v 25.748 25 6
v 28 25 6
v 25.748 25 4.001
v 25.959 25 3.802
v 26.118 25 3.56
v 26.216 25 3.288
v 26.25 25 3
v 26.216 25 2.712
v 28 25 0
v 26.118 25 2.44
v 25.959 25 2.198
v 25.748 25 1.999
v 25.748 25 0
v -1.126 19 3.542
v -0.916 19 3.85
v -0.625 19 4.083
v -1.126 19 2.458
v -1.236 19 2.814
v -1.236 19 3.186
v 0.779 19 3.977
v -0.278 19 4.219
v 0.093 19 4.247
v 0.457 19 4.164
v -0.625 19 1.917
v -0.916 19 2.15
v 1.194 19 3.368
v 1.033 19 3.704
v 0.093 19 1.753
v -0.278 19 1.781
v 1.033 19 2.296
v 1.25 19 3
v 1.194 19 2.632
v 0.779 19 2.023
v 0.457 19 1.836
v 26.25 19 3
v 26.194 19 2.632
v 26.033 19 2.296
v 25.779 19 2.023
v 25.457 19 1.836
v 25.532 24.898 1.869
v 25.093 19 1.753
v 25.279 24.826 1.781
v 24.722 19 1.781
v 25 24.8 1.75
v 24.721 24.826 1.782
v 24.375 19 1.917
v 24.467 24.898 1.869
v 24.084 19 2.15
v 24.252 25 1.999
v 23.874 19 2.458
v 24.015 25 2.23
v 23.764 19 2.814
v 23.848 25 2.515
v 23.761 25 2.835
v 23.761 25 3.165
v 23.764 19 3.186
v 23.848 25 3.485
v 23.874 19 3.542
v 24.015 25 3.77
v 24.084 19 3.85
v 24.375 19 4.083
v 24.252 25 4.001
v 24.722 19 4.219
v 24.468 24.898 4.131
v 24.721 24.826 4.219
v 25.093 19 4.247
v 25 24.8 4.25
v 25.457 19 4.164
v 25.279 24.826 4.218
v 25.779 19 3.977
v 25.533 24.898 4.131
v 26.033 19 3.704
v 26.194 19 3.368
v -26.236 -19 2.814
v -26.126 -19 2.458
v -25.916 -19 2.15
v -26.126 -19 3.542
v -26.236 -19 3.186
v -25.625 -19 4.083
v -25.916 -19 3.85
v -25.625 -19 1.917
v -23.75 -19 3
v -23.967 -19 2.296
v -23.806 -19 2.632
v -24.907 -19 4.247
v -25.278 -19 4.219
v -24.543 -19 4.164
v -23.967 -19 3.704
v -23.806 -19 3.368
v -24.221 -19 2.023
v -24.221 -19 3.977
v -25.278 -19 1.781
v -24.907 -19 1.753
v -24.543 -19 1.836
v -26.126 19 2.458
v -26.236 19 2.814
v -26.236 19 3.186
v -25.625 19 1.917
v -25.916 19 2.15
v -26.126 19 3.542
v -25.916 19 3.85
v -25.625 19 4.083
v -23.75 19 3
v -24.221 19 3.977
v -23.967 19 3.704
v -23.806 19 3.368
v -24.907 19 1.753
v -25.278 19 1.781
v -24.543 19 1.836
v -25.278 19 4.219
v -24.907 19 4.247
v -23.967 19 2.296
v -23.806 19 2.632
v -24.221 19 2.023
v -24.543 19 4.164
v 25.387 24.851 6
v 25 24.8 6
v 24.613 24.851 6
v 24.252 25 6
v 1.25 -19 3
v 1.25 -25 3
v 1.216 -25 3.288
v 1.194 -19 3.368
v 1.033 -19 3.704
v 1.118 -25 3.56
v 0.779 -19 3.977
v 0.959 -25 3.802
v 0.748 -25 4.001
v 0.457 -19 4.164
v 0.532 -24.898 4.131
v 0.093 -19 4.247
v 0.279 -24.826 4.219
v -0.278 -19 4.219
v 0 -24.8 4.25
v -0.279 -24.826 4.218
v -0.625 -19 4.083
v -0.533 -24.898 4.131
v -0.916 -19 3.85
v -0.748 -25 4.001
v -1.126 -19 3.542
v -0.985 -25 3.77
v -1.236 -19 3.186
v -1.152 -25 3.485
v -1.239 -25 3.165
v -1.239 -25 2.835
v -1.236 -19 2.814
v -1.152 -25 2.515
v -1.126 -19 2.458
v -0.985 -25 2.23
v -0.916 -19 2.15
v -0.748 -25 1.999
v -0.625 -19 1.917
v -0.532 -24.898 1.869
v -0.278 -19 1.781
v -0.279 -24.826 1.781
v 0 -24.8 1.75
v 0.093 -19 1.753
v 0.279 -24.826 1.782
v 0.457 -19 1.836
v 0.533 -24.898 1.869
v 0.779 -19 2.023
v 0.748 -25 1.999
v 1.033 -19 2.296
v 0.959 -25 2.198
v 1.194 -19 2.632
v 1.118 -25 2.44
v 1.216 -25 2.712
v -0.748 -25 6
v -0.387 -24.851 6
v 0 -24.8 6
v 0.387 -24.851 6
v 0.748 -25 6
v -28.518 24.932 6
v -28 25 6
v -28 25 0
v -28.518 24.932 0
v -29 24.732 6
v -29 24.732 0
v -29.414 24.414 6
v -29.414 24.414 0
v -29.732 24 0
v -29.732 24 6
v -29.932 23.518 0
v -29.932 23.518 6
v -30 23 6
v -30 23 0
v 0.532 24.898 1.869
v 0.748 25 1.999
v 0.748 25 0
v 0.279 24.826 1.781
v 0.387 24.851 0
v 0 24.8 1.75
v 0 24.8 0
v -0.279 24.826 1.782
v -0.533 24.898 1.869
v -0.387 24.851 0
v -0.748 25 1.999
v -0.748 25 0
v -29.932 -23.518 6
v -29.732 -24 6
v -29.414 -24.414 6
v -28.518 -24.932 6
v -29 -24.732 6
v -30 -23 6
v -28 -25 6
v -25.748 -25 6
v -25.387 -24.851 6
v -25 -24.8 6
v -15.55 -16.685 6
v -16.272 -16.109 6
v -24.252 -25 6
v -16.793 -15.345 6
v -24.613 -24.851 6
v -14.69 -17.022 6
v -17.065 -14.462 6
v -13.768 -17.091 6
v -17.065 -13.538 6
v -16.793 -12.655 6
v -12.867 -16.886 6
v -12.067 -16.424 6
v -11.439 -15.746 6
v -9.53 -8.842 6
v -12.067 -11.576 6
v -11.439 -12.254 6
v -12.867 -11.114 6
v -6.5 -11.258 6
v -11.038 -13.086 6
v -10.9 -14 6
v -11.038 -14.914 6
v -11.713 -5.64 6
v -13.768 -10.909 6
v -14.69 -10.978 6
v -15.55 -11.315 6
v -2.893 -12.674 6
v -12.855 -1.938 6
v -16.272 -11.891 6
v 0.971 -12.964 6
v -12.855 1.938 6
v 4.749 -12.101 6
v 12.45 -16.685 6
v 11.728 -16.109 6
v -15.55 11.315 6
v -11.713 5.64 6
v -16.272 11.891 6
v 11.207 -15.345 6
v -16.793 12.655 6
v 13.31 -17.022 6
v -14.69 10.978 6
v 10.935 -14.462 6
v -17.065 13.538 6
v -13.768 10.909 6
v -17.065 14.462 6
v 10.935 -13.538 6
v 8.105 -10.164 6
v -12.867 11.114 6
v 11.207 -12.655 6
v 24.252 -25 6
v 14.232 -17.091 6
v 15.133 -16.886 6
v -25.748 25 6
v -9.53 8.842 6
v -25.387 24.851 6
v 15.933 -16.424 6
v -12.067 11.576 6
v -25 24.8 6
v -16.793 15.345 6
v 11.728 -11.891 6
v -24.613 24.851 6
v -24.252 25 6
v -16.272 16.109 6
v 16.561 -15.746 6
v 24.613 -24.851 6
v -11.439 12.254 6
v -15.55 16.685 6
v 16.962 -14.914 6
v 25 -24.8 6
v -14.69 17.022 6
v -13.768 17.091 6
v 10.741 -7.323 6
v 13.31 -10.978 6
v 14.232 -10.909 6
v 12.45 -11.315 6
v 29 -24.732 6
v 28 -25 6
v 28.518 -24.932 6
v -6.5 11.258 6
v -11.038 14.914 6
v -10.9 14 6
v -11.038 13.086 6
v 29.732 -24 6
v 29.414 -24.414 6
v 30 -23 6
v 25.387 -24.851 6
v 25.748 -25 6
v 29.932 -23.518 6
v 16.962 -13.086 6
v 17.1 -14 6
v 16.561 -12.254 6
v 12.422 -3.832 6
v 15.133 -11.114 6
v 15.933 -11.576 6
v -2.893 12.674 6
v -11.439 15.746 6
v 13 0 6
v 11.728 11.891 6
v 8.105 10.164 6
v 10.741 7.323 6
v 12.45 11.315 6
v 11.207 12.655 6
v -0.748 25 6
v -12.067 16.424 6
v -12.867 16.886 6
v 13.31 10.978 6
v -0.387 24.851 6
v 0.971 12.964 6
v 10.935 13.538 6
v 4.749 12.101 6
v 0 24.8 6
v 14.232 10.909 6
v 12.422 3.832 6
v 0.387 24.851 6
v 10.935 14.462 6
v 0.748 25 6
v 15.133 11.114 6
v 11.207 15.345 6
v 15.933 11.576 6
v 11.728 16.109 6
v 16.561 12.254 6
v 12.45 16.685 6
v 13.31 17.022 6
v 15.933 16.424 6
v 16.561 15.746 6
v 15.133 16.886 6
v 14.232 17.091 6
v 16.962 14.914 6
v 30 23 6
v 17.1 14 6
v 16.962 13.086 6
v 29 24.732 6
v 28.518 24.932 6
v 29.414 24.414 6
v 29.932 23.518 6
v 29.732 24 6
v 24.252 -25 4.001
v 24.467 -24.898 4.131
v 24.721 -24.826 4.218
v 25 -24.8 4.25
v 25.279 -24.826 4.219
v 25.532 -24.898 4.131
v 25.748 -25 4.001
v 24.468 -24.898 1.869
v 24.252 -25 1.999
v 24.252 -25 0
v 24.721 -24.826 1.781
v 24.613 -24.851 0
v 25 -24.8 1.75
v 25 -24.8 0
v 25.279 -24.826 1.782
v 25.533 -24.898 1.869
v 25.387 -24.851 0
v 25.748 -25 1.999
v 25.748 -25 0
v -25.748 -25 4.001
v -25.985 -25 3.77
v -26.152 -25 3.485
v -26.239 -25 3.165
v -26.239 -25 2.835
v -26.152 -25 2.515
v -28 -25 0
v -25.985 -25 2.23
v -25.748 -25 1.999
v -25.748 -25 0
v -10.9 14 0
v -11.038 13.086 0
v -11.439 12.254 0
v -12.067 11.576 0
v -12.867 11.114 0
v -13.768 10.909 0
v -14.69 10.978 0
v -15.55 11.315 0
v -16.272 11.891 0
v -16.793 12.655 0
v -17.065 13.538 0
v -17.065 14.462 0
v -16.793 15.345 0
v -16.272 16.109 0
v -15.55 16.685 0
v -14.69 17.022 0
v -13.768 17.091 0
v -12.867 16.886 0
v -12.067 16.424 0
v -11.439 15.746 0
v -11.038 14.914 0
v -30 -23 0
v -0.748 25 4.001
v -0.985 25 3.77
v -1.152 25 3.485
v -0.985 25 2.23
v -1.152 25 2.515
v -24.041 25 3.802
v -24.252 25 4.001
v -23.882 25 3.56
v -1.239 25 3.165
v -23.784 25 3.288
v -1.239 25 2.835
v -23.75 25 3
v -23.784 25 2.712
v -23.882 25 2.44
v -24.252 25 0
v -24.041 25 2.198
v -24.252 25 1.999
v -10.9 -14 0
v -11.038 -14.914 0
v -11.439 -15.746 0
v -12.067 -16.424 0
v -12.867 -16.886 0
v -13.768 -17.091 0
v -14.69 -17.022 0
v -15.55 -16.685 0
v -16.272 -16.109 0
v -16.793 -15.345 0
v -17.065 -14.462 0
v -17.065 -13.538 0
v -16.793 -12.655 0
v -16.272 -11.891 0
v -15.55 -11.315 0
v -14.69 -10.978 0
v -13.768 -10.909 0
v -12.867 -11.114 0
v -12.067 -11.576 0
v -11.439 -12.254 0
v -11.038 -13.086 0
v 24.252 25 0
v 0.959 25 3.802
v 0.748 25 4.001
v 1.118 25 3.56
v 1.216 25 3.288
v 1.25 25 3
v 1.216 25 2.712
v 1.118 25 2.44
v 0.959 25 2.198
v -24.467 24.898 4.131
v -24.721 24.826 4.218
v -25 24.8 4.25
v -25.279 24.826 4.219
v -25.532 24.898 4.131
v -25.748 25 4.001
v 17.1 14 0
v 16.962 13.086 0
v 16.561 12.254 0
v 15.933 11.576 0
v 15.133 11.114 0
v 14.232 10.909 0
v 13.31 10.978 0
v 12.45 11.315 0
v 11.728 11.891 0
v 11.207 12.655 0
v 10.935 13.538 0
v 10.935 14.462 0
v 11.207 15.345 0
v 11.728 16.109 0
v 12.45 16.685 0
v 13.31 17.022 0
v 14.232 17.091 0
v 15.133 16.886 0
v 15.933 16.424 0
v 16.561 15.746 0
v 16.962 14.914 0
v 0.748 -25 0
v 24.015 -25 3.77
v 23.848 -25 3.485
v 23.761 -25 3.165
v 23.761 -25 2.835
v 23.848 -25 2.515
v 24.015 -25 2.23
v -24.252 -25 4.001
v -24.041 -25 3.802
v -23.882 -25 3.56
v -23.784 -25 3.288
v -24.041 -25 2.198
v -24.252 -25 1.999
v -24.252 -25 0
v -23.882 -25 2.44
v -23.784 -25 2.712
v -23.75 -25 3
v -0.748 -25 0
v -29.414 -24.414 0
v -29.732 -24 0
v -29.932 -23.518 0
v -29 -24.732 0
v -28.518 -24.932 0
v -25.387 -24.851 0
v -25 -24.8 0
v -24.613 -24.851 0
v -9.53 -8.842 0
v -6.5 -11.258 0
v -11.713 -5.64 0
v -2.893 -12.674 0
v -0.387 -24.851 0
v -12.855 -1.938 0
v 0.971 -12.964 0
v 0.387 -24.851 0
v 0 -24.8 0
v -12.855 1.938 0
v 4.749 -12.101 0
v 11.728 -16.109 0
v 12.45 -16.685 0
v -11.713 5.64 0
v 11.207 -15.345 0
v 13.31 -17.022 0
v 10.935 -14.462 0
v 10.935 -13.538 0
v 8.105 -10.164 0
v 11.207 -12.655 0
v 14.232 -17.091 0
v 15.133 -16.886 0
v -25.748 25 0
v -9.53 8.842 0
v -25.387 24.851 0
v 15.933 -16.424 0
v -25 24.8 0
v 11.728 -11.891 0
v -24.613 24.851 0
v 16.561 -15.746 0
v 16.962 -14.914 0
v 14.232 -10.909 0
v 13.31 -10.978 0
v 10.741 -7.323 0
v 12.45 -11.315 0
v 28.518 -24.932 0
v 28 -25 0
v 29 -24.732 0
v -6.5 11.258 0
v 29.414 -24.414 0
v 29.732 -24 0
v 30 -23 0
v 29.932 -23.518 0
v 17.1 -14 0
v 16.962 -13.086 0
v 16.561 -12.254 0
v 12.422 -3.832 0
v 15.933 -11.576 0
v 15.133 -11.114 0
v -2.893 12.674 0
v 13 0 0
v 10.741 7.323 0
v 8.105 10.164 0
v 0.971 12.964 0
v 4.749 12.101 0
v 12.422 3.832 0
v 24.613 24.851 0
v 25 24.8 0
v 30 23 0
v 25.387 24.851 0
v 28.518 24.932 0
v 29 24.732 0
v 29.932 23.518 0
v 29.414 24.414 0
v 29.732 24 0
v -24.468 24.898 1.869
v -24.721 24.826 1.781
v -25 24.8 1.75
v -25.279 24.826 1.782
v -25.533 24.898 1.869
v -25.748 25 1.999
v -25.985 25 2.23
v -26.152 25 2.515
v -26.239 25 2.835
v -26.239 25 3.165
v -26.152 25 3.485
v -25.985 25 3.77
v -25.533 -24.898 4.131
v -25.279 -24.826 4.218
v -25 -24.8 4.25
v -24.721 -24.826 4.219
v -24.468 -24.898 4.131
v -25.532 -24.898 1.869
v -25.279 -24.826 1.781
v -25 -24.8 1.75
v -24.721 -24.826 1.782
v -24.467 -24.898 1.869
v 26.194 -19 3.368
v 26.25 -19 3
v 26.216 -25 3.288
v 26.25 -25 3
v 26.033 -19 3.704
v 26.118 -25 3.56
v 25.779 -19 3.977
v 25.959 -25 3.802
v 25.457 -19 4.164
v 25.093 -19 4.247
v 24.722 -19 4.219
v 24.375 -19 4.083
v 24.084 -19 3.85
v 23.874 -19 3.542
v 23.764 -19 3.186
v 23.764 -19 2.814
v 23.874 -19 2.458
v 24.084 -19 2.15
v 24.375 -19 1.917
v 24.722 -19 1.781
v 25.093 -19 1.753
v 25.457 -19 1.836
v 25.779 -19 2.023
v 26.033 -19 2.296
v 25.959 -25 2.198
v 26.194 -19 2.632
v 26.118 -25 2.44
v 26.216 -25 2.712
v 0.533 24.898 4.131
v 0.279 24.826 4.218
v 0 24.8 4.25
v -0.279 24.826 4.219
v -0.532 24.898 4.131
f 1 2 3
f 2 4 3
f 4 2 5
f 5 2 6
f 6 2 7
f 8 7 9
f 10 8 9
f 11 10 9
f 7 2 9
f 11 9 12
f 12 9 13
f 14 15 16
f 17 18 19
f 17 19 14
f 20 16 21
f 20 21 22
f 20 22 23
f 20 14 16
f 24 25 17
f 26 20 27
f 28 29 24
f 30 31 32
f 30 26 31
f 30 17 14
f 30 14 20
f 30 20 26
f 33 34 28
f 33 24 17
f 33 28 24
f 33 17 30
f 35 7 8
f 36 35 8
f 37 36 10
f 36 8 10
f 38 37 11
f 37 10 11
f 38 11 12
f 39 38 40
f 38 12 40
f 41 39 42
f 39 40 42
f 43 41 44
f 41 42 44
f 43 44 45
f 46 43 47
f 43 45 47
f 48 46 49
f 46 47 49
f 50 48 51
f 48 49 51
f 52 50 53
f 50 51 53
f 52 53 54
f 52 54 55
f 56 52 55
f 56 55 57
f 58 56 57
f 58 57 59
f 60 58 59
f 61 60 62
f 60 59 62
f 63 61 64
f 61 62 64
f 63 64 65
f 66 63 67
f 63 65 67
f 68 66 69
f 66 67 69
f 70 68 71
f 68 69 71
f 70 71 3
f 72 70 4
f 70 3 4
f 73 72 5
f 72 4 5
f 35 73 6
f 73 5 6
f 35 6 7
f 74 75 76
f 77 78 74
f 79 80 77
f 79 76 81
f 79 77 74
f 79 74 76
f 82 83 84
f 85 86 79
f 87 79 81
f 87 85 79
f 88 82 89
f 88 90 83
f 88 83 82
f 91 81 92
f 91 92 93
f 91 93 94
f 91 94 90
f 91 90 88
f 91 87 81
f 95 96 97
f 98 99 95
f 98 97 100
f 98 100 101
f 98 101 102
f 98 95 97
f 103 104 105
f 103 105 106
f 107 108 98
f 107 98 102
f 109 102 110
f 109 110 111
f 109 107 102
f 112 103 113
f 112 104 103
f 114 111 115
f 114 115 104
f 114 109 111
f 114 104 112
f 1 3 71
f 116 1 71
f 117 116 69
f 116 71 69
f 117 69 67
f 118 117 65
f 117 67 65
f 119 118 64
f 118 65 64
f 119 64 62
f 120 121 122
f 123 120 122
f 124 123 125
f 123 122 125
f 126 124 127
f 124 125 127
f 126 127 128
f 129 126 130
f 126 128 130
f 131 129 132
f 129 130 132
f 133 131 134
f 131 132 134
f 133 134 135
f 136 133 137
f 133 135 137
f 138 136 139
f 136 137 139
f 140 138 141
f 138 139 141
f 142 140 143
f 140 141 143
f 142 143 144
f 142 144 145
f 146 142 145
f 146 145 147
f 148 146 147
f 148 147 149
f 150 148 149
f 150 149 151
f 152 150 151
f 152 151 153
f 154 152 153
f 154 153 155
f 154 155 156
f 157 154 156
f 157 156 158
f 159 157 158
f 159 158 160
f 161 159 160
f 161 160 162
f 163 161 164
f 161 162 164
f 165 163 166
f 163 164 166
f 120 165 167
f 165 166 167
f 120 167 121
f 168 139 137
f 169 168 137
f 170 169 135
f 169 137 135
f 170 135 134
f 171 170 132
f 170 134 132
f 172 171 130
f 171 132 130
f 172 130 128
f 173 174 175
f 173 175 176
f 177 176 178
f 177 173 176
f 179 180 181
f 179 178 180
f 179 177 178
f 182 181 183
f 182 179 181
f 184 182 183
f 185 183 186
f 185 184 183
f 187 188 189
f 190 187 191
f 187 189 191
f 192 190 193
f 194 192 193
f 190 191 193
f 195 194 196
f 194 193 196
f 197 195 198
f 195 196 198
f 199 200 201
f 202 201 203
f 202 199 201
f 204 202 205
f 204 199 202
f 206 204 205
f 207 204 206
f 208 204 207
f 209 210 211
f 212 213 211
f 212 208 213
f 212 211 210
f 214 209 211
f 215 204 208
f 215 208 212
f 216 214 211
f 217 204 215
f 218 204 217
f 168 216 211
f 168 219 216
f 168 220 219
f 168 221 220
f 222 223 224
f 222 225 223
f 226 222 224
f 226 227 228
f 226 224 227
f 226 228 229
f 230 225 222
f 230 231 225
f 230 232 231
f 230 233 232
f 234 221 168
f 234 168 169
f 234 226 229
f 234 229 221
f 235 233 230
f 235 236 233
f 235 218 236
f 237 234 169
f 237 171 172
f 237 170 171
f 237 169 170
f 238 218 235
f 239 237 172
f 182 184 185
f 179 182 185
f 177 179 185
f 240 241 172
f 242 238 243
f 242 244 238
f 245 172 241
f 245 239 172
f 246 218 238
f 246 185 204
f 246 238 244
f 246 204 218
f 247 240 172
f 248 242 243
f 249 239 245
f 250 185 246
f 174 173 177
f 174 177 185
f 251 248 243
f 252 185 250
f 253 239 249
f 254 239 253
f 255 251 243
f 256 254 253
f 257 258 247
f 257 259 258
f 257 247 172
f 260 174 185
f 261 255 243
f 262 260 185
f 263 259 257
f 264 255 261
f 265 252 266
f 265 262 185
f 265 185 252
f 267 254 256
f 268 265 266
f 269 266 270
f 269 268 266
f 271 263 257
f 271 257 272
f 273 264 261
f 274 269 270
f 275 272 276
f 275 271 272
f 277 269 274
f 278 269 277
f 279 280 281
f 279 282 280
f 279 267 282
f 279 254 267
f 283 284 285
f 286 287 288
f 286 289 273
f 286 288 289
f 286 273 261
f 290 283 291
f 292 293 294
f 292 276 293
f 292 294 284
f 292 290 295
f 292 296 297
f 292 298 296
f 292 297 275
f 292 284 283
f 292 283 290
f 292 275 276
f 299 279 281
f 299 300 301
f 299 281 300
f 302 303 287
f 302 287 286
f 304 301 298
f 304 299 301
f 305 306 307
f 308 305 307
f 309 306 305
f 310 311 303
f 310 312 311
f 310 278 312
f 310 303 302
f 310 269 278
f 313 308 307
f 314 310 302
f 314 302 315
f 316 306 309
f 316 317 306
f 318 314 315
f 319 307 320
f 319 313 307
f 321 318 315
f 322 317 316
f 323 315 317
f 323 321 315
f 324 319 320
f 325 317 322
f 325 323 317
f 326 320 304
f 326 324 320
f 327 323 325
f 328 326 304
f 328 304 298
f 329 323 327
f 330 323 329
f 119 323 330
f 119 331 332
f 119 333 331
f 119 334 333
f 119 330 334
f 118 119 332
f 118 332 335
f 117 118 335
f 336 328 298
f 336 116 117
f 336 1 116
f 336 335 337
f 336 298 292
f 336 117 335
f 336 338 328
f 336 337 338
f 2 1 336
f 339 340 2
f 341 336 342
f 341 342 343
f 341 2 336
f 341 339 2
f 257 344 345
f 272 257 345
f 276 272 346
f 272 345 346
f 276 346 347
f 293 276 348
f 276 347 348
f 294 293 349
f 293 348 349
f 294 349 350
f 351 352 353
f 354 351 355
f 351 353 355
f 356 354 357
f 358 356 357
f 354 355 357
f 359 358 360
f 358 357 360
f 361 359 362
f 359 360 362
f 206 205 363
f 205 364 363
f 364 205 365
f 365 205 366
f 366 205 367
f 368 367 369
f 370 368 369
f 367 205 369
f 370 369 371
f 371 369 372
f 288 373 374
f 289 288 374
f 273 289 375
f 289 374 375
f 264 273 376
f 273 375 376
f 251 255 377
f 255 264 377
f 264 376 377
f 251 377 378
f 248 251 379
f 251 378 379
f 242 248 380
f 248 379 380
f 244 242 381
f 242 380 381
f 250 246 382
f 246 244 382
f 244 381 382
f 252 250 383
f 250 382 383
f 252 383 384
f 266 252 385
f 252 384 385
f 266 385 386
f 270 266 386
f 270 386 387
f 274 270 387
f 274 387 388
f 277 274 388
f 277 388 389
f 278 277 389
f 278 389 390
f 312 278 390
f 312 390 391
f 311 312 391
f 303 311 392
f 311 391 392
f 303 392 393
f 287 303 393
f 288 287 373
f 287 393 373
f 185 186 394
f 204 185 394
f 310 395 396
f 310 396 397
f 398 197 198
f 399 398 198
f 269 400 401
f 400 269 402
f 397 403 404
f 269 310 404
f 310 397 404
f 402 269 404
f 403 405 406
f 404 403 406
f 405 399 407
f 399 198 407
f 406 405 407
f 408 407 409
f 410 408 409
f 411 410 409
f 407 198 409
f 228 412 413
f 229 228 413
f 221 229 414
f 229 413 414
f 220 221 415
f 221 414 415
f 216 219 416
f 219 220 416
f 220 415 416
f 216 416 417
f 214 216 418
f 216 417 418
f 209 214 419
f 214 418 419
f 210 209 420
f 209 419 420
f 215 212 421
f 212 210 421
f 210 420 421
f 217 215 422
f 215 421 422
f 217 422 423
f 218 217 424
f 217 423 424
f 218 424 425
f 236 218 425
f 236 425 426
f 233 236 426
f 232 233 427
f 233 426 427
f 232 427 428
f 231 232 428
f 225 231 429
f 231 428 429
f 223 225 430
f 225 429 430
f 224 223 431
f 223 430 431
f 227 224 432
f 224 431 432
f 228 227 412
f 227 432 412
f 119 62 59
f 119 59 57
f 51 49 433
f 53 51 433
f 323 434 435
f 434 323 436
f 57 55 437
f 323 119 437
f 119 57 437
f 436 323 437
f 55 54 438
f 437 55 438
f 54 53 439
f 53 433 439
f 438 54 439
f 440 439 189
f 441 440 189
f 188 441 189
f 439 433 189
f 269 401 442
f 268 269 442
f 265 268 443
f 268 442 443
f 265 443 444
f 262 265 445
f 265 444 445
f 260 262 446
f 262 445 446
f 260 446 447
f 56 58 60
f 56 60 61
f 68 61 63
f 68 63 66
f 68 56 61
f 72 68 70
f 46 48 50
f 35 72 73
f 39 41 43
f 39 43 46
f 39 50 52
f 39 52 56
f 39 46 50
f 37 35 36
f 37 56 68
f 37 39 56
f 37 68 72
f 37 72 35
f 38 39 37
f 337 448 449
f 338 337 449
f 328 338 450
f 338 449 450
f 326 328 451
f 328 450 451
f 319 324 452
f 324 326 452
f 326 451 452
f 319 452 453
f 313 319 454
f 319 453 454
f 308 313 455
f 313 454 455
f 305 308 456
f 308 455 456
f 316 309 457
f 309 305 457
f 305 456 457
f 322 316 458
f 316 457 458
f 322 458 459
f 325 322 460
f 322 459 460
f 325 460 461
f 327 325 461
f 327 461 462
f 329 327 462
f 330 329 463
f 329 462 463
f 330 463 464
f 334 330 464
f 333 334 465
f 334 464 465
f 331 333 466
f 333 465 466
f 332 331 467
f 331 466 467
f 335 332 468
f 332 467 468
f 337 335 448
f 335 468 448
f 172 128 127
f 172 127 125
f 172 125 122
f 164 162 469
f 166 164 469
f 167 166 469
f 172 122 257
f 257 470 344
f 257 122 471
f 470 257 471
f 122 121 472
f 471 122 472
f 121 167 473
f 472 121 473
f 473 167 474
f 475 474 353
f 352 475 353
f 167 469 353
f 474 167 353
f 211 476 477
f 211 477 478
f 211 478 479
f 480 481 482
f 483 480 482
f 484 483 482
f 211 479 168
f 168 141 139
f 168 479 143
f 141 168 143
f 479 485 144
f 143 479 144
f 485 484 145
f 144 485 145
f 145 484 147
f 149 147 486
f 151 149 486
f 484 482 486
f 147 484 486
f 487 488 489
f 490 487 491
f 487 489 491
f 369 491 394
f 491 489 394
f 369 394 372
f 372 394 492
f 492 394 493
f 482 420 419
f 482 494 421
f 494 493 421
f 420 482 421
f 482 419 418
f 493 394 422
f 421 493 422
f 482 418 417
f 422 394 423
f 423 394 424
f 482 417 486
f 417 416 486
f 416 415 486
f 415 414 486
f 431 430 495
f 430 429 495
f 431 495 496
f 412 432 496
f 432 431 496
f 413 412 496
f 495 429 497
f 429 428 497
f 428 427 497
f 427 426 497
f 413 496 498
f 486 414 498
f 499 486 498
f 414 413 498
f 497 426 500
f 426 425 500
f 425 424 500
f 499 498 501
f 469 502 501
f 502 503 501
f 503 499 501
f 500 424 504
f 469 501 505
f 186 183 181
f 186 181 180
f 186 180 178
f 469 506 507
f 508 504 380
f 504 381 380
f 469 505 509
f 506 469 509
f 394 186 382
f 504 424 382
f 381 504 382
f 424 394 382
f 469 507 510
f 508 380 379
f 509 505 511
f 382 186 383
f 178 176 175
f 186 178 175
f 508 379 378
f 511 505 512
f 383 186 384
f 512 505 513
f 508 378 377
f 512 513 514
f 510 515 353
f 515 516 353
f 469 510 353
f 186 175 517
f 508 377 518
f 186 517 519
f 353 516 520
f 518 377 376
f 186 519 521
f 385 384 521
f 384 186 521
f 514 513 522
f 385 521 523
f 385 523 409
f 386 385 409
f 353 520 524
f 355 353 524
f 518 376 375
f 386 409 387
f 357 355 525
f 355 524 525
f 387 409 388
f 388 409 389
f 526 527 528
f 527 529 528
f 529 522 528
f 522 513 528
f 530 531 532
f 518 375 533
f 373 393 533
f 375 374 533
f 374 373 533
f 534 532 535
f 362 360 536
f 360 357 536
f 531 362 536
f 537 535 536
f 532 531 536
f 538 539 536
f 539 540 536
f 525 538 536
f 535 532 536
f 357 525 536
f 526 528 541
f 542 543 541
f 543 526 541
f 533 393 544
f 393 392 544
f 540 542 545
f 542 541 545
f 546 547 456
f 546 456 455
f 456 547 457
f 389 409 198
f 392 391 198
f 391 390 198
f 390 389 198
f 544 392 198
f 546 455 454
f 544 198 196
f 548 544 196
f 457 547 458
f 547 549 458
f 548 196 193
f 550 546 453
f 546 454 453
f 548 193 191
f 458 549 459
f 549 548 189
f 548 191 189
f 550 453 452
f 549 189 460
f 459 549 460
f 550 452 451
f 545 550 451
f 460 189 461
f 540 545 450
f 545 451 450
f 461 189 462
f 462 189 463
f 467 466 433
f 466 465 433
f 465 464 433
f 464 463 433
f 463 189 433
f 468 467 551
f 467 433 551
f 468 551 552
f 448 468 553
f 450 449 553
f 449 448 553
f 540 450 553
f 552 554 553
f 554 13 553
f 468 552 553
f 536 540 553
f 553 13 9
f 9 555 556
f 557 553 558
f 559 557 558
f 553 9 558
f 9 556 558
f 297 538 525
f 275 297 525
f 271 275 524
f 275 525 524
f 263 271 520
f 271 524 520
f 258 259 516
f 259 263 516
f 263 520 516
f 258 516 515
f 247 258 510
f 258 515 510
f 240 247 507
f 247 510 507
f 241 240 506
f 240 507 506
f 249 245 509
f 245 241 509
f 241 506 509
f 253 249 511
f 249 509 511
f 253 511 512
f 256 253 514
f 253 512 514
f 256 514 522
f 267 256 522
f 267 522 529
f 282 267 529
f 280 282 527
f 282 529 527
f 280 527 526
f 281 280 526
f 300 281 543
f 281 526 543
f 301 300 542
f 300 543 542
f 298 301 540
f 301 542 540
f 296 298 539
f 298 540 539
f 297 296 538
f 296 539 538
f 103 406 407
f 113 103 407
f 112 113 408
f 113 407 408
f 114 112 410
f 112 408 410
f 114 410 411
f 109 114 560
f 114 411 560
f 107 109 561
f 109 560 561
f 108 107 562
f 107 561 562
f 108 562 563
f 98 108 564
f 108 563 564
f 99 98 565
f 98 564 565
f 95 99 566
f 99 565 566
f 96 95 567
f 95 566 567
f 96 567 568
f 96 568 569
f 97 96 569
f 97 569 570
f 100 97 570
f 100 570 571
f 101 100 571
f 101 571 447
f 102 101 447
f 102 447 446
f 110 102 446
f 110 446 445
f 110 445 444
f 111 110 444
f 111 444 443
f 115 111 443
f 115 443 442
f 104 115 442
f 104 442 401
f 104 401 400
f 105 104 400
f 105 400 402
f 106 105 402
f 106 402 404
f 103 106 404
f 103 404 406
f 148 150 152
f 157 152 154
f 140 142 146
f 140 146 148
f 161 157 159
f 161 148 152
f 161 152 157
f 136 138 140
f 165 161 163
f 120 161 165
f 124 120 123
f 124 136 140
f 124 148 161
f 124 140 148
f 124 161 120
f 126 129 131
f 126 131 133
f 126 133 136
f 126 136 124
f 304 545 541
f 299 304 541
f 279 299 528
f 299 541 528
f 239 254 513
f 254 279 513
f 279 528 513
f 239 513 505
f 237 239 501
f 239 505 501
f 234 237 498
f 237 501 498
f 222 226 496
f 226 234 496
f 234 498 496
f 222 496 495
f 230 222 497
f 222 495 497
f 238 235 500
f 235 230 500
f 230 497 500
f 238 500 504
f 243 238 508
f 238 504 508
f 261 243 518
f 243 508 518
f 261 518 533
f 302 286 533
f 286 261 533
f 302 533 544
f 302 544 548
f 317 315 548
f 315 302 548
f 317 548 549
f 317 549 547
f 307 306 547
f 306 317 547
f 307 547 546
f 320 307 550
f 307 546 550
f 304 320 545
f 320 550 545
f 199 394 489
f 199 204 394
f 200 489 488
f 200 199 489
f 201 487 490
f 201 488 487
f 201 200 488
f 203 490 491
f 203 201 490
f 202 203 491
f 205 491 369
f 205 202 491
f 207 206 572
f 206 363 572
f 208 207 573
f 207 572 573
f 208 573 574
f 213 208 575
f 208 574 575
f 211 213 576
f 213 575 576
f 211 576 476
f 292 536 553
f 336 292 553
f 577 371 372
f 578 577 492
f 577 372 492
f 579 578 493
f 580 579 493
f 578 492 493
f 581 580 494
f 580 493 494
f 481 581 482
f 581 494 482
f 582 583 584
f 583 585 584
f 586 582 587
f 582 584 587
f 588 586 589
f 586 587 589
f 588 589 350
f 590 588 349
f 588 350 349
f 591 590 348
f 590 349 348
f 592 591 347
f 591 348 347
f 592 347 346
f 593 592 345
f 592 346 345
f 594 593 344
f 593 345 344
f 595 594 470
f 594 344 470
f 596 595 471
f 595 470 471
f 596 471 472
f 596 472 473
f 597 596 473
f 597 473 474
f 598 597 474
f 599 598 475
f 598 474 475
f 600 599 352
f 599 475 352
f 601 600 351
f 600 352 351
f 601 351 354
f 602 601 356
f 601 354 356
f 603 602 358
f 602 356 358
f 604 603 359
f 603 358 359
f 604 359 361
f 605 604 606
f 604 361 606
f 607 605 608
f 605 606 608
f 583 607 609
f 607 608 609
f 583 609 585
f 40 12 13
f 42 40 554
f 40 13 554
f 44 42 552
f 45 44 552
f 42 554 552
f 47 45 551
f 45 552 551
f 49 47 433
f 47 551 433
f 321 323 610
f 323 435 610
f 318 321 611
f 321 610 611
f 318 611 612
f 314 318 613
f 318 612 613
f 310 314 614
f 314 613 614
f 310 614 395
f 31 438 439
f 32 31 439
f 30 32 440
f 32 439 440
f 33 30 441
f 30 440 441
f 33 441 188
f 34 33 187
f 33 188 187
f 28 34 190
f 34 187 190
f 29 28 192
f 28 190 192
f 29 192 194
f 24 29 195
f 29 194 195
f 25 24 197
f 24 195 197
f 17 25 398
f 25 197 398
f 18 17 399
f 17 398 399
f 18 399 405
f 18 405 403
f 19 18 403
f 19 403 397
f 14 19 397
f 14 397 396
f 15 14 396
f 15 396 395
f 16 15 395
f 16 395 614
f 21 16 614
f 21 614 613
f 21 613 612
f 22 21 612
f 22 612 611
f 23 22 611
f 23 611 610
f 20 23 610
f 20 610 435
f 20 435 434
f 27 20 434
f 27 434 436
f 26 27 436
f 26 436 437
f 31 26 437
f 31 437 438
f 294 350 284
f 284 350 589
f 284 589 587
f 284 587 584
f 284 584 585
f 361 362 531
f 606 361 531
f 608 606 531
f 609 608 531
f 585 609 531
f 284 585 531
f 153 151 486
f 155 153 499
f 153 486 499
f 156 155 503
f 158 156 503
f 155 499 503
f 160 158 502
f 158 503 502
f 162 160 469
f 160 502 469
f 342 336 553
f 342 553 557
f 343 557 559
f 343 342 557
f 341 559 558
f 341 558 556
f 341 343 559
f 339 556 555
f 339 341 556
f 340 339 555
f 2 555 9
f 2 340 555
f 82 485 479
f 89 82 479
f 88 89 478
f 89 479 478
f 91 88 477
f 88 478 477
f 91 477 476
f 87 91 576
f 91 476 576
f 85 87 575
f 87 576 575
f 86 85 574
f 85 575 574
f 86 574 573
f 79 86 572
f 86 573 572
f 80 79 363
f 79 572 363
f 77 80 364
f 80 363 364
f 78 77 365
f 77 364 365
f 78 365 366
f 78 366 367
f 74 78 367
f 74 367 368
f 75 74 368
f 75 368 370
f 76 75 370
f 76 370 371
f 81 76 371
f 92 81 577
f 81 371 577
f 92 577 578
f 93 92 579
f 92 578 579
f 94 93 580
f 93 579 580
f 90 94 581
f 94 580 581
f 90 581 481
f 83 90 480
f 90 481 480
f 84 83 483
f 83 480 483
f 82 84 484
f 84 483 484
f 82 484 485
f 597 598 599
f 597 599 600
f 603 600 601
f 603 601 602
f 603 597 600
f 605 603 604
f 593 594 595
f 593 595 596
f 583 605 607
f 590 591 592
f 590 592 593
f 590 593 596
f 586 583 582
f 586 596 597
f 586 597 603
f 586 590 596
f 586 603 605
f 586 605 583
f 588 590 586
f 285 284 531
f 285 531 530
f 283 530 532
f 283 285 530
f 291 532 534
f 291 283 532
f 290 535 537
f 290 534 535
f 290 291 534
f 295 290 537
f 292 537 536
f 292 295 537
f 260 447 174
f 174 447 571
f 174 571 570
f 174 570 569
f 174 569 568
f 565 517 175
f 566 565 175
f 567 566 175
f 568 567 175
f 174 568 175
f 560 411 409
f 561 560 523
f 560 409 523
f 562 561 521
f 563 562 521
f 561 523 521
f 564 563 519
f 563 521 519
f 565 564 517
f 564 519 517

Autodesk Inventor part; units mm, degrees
ref_plane "YZ Plane" through (0, 0, 0) normal (1, 0, 0) x (0, 1, 0)
ref_plane "XZ Plane" through (0, 0, 0) normal (0, 1, 0) x (-1, 0, 0)
ref_plane "XY Plane" through (0, 0, 0) normal (0, 0, 1) x (1, 0, 0)
sketch "スケッチ1" plane through (0, 0, 0) normal (0, 0, 1) x (1, 0, 0)
  circle A0 centre (0, 0) radius 13
  circle A1 centre (-14, 14) radius 3.1
  circle A2 centre (14, 14) radius 3.1
  circle A3 centre (-14, -14) radius 3.1
  circle A4 centre (14, -14) radius 3.1
  line L0 (20, 20) -> (-20, 20) construction
  line L1 (-20, 20) -> (-20, -20) construction
  line L2 (-20, -20) -> (20, -20) construction
  line L3 (20, -20) -> (20, 20) construction
  line L4 (20, 20) -> (-20, -20) construction
  line L5 (-20, 20) -> (20, -20) construction
  line L6 (30, 25) -> (25.7483, 25)
  line L7 (-30, 25) -> (-30, -25)
  line L8 (-30, -25) -> (-25.7483, -25)
  line L9 (30, -25) -> (30, 25)
  line L10 (30, 25) -> (-30, -25) construction
  line L11 (-30, 25) -> (30, -25) construction
  arc A5 (-0.7483, 25) -> (0.7483, 25) centre (0, 26.3) ccw
  arc A6 (-25.7483, 25) -> (-24.2517, 25) centre (-25, 26.3) ccw
  arc A7 (24.2517, 25) -> (25.7483, 25) centre (25, 26.3) ccw
  arc A8 (-24.2517, -25) -> (-25.7483, -25) centre (-25, -26.3) ccw
  arc A9 (0.7483, -25) -> (-0.7483, -25) centre (0, -26.3) ccw
  arc A10 (25.7483, -25) -> (24.2517, -25) centre (25, -26.3) ccw
  arc A11 (-24.2517, 25) -> (-25.7483, 25) centre (-25, 26.3) ccw construction
  arc A12 (0.7483, 25) -> (-0.7483, 25) centre (0, 26.3) ccw construction
  arc A13 (25.7483, 25) -> (24.2517, 25) centre (25, 26.3) ccw construction
  arc A14 (-25.7483, -25) -> (-24.2517, -25) centre (-25, -26.3) ccw construction
  arc A15 (-0.7483, -25) -> (0.7483, -25) centre (0, -26.3) ccw construction
  arc A16 (24.2517, -25) -> (25.7483, -25) centre (25, -26.3) ccw construction
  line L12 (-24.2517, 25) -> (-25.7483, 25) construction
  line L13 (-25.7483, 25) -> (-30, 25)
  line L14 (-0.7483, 25) -> (-24.2517, 25)
  line L15 (0.7483, 25) -> (-0.7483, 25) construction
  line L16 (25.7483, 25) -> (24.2517, 25) construction
  line L17 (24.2517, 25) -> (0.7483, 25)
  line L18 (-24.2517, -25) -> (-0.7483, -25)
  line L19 (-25.7483, -25) -> (-24.2517, -25) construction
  line L20 (0.7483, -25) -> (24.2517, -25)
  line L21 (-0.7483, -25) -> (0.7483, -25) construction
  line L22 (25.7483, -25) -> (30, -25)
  line L23 (24.2517, -25) -> (25.7483, -25) construction
  dimension "d0" = 26
  dimension "d1" = 6.2
  dimension "d2" = 6.2
  dimension "d3" = 6.2
  dimension "d4" = 6.2
  dimension "d5" = 28
  dimension "d6" = 28
  dimension "d7" = 14
  dimension "d8" = 14
  dimension "d9" = 40
  dimension "d10" = 40
  dimension "d11" = 10
  dimension "d12" = 5
  dimension "d13" = 3
  dimension "d14" = 3
  dimension "d15" = 3
  dimension "d16" = 3
  dimension "d17" = 3
  dimension "d18" = 3
  dimension "d19" = 1.3
  dimension "d20" = 1.3
  dimension "d21" = 25
  dimension "d22" = 25
extrude "押し出し1" add sketch "スケッチ1" along normal blind 6
sketch "スケッチ2" plane through (-24.2517, 25, 0) normal (0, 1, 0) x (1, 0, 0)
  circle A0 centre (-0.7483, -3) radius 1.25
  circle A1 centre (24.2517, -3) radius 1.25
  circle A2 centre (49.2517, -3) radius 1.25
  point P0 (24.2517, 0)
  dimension "d25" = 2.5
  dimension "d26" = 2.5
  dimension "d27" = 2.5
  dimension "d28" = 25
  dimension "d29" = 25
  dimension "d30" = 3
extrude "押し出し2" cut sketch "スケッチ2" against normal blind 6
sketch "スケッチ3" plane through (-24.2517, -25, 0) normal (0, -1, 0) x (1, 0, 0)
  circle A0 centre (24.2517, 3) radius 1.25 projected
  circle A1 centre (-0.7483, 3) radius 1.25 projected
  circle A2 centre (49.2517, 3) radius 1.25 projected
  point P0 (24.2517, 0)
extrude "押し出し3" cut sketch "スケッチ3" against normal blind 6
fillet "フィレット1" radius 2 4 edges at (-30, 25, 3) (30, 25, 3) (30, -25, 3) (-30, -25, 3)
equation "\"d7\" = 0.5 * d5"
equation "\"d8\" = 0.5 * d6"
properties part number "ハンド_エアシリンダ固定具" material "ポリカーボネート、スモーク"
